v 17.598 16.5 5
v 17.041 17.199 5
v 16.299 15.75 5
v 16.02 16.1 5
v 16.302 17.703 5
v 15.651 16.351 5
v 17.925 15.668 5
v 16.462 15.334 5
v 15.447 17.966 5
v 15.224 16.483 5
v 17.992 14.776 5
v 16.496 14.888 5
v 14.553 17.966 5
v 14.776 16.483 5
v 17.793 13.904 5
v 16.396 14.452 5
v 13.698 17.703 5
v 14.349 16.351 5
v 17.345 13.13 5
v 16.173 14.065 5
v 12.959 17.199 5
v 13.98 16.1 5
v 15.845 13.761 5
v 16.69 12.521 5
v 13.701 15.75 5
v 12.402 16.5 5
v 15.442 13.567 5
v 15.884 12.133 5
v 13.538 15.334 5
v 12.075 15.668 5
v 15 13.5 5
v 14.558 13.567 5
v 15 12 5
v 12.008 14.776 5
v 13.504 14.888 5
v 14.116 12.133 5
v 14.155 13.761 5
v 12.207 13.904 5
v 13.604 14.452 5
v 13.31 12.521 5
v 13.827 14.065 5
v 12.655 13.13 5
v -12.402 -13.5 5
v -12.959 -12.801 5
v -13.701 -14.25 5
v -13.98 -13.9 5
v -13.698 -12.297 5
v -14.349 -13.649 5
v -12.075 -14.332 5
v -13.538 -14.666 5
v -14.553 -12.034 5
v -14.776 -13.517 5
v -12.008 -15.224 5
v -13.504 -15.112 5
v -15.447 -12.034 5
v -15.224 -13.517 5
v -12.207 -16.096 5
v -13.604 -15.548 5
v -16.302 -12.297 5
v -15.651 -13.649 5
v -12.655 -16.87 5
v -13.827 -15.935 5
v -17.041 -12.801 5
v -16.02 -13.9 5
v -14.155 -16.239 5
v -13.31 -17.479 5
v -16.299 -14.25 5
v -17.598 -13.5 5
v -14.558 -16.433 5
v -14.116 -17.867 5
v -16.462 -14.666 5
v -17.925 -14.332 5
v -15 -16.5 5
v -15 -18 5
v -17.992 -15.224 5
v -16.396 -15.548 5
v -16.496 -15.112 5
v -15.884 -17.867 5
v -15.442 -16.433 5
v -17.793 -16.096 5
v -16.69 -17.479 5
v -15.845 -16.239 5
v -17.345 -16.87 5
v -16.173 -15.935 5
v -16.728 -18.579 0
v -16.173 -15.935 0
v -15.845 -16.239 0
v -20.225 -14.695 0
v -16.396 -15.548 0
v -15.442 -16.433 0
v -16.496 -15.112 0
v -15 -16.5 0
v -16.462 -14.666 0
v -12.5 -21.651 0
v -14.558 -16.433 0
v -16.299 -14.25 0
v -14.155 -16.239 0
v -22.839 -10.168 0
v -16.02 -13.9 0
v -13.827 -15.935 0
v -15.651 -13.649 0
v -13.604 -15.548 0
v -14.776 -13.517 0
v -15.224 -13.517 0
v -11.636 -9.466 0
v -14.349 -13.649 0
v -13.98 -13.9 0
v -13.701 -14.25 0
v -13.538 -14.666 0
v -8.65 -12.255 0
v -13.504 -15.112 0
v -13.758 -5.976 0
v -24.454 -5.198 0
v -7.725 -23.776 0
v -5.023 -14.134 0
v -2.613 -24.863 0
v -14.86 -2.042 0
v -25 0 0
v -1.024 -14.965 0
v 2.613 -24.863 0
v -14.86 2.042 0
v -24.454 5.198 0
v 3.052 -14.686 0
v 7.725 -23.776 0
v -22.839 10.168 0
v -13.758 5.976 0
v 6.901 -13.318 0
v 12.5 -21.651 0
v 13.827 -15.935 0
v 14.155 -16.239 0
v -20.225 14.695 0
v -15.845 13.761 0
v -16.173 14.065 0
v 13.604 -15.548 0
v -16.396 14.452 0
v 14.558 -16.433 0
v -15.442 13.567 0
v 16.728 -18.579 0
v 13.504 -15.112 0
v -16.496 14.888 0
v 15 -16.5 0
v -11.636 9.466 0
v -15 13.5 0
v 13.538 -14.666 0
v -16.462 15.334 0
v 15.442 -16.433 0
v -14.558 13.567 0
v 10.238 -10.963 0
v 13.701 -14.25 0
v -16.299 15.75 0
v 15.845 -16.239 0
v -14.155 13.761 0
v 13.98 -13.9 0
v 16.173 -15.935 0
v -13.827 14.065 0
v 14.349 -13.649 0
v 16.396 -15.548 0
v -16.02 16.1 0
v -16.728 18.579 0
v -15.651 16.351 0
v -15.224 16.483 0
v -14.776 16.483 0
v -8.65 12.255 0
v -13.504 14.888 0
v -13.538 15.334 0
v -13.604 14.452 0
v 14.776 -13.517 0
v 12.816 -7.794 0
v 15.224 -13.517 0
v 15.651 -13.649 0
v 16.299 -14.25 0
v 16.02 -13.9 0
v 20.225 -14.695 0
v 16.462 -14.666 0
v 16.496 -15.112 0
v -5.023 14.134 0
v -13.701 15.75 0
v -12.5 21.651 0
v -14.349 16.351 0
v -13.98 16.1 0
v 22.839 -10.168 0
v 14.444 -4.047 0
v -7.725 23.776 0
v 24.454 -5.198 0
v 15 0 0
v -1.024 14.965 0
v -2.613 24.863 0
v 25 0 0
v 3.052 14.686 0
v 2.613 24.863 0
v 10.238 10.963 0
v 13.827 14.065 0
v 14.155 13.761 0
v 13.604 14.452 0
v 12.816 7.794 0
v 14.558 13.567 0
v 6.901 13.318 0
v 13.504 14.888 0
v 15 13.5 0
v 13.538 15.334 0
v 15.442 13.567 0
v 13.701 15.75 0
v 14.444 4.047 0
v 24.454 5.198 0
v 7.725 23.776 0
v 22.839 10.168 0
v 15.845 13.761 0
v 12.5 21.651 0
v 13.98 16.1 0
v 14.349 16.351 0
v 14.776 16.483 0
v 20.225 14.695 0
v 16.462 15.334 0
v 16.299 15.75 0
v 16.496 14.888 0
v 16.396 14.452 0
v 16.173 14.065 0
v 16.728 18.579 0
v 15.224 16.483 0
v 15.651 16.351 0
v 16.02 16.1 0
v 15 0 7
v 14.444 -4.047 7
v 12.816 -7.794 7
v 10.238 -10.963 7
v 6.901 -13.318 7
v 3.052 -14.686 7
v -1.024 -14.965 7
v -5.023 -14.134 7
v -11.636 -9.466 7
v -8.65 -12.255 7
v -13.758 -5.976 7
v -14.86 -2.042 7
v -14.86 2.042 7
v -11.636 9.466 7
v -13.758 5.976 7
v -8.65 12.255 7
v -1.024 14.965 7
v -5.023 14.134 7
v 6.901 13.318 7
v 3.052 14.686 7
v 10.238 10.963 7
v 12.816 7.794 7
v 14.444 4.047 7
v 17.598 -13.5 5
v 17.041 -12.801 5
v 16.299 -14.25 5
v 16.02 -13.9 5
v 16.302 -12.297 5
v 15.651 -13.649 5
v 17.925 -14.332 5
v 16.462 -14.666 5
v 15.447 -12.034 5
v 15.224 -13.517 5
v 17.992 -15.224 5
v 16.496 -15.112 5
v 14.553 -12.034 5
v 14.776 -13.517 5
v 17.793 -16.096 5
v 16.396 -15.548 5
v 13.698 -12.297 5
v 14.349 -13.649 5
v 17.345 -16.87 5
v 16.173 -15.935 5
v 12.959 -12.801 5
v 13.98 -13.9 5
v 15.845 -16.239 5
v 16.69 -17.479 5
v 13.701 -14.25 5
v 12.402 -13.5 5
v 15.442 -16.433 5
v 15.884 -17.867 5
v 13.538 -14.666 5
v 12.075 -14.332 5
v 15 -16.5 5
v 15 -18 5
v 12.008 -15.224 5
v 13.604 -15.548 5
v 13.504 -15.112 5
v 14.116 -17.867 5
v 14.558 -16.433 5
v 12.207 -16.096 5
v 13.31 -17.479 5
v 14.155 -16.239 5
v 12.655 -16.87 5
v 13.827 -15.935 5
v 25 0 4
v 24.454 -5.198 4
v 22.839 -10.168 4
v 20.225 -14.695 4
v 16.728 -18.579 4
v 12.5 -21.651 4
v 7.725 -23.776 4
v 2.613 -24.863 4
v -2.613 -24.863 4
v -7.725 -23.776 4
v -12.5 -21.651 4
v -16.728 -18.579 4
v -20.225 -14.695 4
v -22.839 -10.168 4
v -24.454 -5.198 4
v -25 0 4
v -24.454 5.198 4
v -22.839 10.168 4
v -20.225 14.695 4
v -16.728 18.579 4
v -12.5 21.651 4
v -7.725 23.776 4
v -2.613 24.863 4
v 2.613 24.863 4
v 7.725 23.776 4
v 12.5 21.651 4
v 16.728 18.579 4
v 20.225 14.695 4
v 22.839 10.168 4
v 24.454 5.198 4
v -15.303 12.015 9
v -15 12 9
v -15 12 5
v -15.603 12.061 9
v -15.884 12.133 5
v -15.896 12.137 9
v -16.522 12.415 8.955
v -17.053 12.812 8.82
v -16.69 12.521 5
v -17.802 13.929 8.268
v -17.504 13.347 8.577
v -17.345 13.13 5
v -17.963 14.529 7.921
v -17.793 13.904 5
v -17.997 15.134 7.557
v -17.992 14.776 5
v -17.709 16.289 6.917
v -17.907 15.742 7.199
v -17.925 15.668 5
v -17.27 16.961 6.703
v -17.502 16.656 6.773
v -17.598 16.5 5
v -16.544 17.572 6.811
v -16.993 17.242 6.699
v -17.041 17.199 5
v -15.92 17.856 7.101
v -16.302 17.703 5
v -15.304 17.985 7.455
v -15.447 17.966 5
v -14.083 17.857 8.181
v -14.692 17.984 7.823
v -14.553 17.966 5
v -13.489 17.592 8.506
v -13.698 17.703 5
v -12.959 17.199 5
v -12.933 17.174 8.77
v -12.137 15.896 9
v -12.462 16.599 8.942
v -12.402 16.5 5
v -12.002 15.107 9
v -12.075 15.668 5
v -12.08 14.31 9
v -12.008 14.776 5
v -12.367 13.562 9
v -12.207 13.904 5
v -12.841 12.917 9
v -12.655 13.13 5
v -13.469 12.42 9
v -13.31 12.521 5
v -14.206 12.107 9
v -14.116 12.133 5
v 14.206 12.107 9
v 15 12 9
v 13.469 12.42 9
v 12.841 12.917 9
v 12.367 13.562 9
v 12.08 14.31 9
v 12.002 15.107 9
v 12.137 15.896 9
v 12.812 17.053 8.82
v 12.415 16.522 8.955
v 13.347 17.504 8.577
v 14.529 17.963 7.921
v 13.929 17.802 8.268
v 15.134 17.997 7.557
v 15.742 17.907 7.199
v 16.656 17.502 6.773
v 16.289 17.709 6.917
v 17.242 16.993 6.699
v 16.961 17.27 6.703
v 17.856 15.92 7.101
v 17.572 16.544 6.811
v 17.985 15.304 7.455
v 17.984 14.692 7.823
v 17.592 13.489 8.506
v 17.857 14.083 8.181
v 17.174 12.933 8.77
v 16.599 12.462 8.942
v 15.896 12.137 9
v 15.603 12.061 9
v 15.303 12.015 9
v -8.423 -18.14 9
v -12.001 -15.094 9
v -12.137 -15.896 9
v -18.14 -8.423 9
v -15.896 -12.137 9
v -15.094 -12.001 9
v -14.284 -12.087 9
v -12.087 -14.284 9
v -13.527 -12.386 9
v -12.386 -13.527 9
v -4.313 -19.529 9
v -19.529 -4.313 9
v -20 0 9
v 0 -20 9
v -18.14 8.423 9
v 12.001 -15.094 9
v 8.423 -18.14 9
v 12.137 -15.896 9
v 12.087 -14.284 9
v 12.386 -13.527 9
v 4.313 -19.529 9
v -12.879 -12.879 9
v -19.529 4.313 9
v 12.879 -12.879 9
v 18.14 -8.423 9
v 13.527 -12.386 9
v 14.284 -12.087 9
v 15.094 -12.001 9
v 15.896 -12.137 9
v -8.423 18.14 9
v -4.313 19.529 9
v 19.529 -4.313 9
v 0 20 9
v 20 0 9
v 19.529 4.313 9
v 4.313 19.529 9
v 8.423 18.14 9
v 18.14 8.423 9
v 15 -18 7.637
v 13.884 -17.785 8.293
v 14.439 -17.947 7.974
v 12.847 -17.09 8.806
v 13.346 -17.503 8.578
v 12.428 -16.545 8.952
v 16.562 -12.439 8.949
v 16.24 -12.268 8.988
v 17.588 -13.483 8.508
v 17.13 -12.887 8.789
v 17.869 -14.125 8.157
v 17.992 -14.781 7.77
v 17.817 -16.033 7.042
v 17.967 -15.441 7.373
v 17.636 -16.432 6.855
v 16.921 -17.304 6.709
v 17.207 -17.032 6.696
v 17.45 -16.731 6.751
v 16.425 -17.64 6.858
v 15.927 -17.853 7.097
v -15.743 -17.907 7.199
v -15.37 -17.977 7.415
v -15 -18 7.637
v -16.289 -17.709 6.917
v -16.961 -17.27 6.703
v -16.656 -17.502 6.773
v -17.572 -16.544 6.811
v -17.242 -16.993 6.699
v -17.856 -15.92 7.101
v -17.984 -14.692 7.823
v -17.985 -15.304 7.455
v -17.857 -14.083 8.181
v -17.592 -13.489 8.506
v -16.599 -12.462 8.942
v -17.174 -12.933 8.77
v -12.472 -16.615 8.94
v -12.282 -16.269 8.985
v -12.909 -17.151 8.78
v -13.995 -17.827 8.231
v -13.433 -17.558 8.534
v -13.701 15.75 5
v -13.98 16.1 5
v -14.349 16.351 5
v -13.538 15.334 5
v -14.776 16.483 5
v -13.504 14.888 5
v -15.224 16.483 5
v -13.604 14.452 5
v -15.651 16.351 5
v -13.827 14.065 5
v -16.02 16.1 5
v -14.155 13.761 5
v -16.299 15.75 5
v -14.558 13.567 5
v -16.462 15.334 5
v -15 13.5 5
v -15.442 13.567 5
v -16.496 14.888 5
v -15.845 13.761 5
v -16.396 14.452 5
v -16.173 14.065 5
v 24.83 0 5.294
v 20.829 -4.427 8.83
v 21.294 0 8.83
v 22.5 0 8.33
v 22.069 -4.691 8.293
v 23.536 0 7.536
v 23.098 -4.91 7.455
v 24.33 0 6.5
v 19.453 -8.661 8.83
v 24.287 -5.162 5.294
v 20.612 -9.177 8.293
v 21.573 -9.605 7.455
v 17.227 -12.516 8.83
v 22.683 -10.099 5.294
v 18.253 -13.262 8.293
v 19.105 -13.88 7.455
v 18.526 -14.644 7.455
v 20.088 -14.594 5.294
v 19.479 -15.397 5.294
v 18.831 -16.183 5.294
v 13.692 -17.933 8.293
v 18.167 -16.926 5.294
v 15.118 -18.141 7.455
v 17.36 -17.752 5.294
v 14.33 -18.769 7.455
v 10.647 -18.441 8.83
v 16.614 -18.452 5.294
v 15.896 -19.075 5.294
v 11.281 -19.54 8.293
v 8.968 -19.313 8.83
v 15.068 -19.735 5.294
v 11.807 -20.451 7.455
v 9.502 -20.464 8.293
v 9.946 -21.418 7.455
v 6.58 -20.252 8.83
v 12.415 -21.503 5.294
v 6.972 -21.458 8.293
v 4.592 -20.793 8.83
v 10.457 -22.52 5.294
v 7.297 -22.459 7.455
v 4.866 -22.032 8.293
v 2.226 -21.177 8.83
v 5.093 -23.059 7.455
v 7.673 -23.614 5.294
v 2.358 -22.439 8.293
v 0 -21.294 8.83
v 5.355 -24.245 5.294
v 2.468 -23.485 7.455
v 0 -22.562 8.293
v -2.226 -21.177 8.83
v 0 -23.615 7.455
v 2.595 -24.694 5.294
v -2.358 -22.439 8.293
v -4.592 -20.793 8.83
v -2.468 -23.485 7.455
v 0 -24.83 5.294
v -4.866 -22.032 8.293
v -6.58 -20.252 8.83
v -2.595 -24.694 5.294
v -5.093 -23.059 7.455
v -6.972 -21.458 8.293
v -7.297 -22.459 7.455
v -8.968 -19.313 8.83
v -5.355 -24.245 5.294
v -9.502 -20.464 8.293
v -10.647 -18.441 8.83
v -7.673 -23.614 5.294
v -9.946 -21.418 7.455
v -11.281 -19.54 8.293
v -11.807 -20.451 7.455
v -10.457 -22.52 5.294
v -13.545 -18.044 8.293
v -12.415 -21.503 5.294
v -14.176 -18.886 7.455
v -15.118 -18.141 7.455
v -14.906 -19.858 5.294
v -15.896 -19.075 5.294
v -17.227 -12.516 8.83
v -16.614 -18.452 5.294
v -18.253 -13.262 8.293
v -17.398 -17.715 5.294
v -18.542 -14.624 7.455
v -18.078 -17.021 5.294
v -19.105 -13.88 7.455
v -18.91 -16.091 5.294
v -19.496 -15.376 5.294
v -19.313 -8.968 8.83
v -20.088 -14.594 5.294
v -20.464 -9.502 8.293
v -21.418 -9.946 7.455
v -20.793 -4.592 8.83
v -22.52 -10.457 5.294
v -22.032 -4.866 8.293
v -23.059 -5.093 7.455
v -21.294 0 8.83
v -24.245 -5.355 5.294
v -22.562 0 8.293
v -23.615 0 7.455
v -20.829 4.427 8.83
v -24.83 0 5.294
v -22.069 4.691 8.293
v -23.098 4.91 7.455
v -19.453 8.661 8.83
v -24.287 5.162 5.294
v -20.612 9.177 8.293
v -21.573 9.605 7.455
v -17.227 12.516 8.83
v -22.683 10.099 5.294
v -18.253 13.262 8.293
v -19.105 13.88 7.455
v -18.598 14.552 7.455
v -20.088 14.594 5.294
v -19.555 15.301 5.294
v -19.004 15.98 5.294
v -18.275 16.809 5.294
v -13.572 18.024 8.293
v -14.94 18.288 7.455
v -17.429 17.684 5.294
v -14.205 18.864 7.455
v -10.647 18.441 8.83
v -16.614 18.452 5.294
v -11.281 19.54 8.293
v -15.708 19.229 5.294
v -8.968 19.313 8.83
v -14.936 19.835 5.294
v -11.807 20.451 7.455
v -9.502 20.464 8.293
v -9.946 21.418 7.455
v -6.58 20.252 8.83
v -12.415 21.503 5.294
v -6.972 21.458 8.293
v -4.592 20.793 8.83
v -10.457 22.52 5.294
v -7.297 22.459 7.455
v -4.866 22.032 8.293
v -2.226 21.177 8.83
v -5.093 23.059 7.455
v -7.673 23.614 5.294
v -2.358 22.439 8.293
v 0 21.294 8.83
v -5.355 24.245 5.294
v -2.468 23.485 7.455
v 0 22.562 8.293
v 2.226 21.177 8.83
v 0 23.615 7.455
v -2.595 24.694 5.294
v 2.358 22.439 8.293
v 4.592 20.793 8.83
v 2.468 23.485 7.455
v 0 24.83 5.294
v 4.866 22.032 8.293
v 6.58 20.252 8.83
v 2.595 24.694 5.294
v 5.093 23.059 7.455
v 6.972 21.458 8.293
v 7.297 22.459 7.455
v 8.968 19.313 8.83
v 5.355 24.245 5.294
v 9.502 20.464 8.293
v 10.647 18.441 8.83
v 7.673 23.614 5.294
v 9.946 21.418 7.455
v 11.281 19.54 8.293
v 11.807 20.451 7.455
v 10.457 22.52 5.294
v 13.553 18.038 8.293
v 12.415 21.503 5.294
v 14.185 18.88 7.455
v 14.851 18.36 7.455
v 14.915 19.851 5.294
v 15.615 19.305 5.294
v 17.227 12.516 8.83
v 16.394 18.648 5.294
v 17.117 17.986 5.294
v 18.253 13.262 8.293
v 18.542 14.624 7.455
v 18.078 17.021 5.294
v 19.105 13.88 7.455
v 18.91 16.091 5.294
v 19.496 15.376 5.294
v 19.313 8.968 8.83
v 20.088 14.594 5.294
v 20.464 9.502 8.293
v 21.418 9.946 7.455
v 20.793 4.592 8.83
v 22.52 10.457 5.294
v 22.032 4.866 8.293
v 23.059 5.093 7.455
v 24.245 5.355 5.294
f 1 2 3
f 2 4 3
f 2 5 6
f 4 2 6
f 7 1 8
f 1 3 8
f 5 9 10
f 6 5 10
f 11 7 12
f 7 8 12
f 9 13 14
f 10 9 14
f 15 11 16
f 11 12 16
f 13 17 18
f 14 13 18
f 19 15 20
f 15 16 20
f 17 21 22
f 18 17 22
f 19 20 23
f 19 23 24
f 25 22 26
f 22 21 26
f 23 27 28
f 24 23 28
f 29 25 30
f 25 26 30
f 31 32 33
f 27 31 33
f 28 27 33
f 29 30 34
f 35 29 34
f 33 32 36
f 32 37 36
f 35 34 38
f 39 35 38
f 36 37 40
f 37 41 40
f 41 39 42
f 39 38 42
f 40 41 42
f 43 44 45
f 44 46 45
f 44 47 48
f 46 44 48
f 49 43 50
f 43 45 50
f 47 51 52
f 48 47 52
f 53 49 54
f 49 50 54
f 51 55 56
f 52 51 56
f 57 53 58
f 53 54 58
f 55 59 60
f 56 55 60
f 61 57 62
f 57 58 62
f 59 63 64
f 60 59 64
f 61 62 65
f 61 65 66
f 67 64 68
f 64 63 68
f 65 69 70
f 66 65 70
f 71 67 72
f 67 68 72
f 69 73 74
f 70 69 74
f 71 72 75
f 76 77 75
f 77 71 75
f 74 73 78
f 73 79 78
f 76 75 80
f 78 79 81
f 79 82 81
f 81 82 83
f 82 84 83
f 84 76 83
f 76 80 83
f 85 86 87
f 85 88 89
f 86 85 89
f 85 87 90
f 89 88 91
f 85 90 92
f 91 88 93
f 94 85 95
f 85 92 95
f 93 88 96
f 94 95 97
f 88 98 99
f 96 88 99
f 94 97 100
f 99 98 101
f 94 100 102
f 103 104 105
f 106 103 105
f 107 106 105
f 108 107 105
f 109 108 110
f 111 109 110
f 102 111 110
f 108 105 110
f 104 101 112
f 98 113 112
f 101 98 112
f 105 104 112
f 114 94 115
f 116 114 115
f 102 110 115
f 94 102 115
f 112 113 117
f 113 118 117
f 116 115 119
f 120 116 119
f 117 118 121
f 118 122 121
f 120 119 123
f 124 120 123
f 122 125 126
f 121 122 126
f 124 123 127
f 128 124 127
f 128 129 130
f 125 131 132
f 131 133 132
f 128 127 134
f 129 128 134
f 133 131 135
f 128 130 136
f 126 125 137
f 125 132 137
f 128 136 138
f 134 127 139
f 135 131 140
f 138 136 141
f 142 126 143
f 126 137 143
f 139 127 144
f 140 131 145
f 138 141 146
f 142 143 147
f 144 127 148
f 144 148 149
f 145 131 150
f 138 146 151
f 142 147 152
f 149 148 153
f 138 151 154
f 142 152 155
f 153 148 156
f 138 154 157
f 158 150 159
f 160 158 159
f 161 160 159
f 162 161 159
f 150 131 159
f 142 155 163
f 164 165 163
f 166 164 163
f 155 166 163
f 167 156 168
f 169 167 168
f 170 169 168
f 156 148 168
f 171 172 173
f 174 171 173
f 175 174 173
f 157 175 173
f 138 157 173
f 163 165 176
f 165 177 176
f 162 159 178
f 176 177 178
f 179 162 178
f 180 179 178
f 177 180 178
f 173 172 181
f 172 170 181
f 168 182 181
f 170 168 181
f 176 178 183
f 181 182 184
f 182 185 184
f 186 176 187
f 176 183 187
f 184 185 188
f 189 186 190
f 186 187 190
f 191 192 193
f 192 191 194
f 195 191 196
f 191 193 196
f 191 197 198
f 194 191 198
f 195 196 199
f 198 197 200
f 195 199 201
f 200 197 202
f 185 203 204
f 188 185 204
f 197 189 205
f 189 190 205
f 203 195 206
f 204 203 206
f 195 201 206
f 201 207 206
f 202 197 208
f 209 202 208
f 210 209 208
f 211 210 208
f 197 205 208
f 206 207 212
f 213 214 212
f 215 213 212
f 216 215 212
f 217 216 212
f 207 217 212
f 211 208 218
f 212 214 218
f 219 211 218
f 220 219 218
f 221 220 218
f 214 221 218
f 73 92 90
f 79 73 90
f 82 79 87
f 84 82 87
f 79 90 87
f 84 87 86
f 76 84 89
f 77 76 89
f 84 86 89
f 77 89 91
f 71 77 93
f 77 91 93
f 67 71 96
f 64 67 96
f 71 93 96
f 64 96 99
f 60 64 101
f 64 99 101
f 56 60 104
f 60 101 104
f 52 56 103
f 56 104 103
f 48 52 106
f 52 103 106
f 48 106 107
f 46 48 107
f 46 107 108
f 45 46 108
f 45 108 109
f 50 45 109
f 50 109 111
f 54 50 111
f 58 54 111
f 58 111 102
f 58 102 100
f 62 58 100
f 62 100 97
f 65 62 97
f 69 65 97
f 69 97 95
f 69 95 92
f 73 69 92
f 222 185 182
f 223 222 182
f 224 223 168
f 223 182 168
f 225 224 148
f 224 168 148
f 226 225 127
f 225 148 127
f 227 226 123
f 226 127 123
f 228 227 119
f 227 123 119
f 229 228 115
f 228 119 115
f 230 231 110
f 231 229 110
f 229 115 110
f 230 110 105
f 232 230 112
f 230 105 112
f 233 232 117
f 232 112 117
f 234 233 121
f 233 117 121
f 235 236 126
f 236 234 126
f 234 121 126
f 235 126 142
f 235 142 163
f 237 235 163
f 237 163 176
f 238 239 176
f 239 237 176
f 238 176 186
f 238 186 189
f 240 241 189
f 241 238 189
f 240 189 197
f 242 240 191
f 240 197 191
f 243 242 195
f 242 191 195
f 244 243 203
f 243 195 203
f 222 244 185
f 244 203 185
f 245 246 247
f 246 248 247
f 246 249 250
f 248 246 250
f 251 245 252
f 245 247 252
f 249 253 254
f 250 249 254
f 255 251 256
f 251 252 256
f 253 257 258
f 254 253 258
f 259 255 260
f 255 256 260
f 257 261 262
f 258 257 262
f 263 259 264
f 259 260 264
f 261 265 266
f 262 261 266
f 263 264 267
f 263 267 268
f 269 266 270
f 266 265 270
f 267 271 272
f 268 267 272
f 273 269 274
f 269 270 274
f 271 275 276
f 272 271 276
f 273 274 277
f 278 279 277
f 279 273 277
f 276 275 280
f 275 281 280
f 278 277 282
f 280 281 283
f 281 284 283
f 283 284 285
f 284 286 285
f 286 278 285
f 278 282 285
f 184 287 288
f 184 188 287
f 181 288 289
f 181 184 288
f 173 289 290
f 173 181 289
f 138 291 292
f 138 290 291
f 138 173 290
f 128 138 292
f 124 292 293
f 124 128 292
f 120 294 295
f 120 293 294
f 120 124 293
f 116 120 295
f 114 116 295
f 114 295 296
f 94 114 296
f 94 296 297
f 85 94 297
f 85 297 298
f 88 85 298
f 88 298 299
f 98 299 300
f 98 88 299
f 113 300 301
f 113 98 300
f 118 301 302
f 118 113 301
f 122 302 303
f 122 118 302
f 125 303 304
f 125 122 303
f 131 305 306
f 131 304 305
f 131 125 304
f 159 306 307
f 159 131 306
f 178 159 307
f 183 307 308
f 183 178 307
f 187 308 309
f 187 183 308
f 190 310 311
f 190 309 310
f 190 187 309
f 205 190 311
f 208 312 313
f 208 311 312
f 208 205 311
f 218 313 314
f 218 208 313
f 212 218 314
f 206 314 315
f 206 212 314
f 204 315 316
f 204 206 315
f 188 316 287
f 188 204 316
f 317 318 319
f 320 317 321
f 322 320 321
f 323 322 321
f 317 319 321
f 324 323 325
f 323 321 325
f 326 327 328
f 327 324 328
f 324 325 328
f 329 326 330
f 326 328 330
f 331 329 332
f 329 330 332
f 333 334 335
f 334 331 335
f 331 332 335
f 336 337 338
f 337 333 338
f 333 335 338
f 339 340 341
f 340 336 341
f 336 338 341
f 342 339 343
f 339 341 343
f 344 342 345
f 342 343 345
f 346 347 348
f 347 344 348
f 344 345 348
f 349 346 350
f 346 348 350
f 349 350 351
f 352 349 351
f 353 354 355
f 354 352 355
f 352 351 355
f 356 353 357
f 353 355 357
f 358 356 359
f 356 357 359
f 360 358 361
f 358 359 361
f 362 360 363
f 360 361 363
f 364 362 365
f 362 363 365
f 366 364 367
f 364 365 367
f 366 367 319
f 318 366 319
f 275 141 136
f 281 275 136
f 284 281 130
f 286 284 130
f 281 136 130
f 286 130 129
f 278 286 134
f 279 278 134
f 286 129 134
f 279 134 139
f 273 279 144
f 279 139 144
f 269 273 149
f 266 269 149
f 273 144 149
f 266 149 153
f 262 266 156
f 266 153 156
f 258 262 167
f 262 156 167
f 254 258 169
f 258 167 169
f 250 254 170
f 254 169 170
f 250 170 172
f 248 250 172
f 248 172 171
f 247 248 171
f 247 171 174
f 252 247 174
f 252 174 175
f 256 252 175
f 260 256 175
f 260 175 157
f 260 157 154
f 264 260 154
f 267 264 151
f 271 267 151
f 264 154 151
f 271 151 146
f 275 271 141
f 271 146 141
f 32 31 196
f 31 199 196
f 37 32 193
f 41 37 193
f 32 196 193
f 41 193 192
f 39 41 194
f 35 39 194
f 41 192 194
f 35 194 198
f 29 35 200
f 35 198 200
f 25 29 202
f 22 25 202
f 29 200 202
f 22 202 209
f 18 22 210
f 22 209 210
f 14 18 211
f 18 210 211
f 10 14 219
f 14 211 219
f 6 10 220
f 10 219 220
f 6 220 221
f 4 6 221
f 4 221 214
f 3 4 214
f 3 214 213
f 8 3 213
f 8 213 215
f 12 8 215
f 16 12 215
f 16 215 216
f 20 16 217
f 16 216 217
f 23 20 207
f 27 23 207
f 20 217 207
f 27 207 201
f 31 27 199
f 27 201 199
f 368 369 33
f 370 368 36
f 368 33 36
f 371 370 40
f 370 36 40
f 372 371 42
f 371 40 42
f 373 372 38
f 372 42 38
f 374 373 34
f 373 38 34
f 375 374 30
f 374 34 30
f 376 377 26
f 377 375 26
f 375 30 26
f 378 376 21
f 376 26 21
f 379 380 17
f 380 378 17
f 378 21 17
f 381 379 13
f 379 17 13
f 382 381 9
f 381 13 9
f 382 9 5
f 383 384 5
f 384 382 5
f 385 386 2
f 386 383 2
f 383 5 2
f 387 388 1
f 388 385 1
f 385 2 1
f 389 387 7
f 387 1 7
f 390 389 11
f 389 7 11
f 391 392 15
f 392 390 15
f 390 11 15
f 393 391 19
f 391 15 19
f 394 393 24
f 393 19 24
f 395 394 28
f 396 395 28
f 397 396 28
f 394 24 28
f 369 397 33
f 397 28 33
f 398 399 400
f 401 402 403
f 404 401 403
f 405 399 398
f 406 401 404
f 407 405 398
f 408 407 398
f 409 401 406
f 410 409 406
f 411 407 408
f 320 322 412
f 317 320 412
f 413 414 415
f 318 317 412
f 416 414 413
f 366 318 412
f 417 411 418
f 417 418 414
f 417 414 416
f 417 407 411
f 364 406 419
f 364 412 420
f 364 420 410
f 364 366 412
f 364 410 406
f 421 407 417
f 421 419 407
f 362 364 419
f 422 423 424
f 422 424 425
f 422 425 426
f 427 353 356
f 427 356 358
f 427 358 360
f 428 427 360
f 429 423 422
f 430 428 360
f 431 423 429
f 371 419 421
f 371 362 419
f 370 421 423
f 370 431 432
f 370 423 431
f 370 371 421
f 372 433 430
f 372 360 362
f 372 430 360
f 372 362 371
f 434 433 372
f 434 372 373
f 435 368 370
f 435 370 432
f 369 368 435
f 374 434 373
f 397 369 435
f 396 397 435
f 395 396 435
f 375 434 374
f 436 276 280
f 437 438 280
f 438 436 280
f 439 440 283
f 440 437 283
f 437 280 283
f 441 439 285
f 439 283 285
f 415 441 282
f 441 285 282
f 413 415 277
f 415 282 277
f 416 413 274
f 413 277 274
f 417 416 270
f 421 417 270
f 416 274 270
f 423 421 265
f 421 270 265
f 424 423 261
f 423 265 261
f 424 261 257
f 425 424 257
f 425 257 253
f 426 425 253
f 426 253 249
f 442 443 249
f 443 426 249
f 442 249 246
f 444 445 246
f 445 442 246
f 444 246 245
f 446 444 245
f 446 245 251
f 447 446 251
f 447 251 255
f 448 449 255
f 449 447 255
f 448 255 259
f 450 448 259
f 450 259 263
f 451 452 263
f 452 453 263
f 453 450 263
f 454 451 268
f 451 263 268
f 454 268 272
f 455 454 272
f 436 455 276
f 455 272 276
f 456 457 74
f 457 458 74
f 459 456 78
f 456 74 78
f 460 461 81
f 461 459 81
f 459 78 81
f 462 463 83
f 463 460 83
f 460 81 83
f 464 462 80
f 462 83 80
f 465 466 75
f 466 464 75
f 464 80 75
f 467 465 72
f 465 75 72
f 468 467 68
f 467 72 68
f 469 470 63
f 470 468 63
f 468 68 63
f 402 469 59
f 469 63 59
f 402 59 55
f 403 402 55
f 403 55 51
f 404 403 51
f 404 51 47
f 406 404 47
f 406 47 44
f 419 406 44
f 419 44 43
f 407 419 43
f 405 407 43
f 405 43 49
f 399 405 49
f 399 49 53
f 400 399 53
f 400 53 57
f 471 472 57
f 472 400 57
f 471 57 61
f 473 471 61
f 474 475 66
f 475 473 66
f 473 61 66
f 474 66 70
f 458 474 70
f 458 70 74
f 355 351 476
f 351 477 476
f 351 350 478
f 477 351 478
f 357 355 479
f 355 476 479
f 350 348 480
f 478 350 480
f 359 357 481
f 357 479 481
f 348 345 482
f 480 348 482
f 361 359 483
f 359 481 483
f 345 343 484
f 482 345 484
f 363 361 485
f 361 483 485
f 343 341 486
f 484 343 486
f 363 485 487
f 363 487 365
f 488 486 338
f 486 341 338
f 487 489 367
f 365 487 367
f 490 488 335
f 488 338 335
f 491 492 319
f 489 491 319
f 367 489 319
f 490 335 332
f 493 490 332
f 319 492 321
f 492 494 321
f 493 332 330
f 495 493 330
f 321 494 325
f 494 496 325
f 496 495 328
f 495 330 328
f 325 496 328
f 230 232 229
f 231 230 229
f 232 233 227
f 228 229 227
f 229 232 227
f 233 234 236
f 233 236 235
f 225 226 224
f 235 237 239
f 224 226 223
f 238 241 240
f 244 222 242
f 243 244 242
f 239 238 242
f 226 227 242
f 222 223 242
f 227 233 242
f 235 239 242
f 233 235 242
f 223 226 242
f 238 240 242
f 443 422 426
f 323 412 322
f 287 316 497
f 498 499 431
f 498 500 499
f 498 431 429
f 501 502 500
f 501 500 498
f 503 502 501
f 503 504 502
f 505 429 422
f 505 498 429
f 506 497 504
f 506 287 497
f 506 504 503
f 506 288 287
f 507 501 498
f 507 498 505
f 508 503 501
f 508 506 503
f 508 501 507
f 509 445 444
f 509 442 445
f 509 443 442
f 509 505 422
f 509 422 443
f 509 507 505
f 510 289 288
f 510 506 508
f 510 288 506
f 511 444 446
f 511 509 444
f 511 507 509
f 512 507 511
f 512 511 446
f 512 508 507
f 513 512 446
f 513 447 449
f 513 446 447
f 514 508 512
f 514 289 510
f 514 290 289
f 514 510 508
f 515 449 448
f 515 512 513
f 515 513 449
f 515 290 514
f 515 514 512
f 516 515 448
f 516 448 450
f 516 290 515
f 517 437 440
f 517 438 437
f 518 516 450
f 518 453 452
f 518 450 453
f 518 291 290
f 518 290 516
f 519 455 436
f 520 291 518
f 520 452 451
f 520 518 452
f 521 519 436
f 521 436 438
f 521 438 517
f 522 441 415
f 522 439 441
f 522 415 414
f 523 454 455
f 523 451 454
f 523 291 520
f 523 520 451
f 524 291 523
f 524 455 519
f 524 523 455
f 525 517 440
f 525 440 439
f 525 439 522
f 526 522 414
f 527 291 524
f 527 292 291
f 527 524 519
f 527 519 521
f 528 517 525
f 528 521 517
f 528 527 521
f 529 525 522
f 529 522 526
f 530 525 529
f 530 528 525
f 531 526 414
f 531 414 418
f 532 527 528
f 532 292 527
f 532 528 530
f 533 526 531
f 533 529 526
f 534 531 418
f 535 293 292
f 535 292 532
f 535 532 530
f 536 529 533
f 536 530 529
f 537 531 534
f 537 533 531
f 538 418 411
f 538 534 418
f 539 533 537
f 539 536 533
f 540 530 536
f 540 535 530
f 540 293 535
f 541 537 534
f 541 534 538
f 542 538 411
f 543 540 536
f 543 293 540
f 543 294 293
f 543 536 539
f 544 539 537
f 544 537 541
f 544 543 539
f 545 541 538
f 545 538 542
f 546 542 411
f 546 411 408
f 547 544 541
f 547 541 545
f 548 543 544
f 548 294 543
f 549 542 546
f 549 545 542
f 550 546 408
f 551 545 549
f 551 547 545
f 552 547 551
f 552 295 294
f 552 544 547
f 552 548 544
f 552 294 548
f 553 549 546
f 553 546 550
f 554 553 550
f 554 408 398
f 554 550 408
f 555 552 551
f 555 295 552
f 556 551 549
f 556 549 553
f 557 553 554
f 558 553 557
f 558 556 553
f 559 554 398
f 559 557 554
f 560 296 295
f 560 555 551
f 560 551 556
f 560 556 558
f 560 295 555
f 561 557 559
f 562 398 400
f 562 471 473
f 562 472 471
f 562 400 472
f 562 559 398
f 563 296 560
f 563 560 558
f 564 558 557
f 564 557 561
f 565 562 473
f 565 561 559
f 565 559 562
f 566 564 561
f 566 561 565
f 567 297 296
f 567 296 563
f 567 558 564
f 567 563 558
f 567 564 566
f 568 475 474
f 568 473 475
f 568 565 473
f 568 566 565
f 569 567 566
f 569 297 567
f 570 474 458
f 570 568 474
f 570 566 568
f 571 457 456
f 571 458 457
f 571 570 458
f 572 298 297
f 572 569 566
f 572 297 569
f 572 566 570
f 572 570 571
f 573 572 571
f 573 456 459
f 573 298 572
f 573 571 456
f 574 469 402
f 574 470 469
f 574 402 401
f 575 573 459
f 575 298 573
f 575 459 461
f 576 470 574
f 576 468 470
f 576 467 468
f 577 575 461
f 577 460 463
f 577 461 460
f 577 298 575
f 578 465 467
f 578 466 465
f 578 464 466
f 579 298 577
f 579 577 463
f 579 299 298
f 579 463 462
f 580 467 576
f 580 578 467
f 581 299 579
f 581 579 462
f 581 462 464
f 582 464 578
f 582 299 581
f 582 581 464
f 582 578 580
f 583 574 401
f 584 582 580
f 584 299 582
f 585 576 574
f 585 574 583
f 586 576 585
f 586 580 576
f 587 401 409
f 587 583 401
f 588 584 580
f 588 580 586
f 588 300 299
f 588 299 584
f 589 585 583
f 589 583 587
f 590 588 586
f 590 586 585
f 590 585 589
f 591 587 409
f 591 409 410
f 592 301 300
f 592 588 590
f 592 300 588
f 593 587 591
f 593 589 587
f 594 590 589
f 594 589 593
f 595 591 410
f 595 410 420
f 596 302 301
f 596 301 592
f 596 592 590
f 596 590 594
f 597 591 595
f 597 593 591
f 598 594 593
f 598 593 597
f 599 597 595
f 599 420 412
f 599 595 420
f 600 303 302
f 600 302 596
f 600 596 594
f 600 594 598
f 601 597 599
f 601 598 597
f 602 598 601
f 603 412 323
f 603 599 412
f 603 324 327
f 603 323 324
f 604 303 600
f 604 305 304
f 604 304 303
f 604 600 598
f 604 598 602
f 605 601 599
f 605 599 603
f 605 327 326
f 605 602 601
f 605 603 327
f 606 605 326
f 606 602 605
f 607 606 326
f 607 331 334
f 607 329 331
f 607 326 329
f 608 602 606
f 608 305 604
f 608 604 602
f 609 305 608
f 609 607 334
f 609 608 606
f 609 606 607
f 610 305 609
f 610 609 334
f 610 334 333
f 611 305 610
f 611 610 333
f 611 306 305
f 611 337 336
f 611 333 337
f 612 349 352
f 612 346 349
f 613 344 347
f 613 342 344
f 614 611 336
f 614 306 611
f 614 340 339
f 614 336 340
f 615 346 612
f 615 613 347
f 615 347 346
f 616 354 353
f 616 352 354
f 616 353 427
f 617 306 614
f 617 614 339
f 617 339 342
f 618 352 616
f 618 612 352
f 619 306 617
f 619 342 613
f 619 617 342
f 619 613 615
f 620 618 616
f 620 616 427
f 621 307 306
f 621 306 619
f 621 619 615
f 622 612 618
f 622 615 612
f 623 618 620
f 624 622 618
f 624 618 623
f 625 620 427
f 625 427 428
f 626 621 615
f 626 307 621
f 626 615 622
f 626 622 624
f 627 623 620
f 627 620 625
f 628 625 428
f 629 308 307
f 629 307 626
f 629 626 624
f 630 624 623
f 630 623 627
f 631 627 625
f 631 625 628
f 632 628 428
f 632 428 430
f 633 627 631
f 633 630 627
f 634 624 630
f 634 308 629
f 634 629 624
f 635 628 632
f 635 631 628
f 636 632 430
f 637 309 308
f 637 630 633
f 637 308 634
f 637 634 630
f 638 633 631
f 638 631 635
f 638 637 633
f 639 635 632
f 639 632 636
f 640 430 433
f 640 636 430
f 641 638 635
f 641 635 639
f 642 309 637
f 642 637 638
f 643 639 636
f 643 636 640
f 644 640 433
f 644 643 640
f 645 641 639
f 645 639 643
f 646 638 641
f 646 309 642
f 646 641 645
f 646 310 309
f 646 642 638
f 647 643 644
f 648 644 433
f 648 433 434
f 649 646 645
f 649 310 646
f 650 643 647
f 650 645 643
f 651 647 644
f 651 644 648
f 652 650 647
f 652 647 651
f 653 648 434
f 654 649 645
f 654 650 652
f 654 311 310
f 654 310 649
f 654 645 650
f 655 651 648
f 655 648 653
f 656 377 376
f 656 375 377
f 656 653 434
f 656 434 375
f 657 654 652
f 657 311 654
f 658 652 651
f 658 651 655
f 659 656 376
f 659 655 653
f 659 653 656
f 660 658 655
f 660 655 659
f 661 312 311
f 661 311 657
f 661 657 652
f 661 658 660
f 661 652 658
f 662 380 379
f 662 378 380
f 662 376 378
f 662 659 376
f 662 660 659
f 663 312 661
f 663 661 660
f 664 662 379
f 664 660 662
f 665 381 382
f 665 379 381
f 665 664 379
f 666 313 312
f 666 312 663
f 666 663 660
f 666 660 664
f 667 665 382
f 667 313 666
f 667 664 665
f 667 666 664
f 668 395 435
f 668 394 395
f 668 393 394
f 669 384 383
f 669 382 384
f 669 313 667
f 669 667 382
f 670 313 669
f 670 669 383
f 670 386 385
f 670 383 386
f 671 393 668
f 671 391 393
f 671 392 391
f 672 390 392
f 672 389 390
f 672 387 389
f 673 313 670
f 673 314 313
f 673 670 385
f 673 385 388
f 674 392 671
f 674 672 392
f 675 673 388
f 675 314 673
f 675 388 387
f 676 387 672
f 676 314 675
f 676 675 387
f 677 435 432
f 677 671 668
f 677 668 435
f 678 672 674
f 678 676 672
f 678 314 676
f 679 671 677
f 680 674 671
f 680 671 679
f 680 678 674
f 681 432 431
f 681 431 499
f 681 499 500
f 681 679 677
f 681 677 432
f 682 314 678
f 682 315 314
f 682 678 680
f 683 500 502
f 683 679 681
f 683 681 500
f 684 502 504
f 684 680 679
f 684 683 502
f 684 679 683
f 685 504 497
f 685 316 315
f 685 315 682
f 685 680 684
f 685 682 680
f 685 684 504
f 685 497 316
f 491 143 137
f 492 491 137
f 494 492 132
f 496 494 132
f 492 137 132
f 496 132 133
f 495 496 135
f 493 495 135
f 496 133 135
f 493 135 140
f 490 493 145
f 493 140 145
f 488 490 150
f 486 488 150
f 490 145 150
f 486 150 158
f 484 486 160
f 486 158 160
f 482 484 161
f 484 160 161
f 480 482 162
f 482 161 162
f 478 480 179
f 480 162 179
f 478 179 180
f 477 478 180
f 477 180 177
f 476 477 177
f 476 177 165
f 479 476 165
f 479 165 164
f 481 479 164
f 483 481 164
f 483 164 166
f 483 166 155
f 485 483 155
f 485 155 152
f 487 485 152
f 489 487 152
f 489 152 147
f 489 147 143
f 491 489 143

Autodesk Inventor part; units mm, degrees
ref_plane "YZ Plane" through (0, 0, 0) normal (1, 0, 0) x (0, 1, 0)
ref_plane "XZ Plane" through (0, 0, 0) normal (0, 1, 0) x (-1, 0, 0)
ref_plane "XY Plane" through (0, 0, 0) normal (0, 0, 1) x (1, 0, 0)
sketch "Skizze1" plane through (0, 0, 0) normal (0, 0, 1) x (1, 0, 0)
  circle A0 centre (0, 0) radius 11.1 construction
  circle A1 centre (0, 0) radius 25 projected
  circle A2 centre (0, 0) radius 15
  circle A3 centre (-15, -15) radius 1.25 projected
  circle A4 centre (15, 15) radius 1.25 projected
  circle A5 centre (15, -15) radius 1.25 projected
  circle A6 centre (-15, 15) radius 1.25 projected
  point P0 (0, 0)
  dimension "d0" = 30
extrude "Extrusion1" add sketch "Skizze1" along normal blind 9 contours A1 | A3 | A4 | A5 | A6
sketch "Skizze2" plane through (0, 0, 9) normal (0, 0, 1) x (1, 0, 0)
  circle A0 centre (0, 0) radius 15 projected
  circle A1 centre (0, 0) radius 25 projected
  point P0 (0, 0)
extrude "Extrusion2" add sketch "Skizze2" against normal blind 2 contours A0
fillet "Rundung1" radius 5 1 edges at (-25, 0, 9)
sketch "Skizze3" plane through (0, 0, 9) normal (0, 0, 1) x (1, 0, 0)
  line L0 (-15, -15) -> (15, -15)
  line L1 (15, -15) -> (15, 15)
  line L2 (15, 15) -> (-15, 15)
  line L3 (-15, 15) -> (-15, -15)
  line L4 (-15, -15) -> (15, 15) construction
  line L5 (15, -15) -> (-15, 15) construction
  point P0 (0, 0)
  dimension "d6" = 30
hole "Bohrung1" at (-15, 15, 9) at (15, 15, 9) at (15, -15, 9) at (-15, -15, 9) direction (0, 0, -1) diameter 3 end through all counterbore diameter 6 counterbore depth 4
properties part number "Cover_G2" material "ABS-Kunststoff"
